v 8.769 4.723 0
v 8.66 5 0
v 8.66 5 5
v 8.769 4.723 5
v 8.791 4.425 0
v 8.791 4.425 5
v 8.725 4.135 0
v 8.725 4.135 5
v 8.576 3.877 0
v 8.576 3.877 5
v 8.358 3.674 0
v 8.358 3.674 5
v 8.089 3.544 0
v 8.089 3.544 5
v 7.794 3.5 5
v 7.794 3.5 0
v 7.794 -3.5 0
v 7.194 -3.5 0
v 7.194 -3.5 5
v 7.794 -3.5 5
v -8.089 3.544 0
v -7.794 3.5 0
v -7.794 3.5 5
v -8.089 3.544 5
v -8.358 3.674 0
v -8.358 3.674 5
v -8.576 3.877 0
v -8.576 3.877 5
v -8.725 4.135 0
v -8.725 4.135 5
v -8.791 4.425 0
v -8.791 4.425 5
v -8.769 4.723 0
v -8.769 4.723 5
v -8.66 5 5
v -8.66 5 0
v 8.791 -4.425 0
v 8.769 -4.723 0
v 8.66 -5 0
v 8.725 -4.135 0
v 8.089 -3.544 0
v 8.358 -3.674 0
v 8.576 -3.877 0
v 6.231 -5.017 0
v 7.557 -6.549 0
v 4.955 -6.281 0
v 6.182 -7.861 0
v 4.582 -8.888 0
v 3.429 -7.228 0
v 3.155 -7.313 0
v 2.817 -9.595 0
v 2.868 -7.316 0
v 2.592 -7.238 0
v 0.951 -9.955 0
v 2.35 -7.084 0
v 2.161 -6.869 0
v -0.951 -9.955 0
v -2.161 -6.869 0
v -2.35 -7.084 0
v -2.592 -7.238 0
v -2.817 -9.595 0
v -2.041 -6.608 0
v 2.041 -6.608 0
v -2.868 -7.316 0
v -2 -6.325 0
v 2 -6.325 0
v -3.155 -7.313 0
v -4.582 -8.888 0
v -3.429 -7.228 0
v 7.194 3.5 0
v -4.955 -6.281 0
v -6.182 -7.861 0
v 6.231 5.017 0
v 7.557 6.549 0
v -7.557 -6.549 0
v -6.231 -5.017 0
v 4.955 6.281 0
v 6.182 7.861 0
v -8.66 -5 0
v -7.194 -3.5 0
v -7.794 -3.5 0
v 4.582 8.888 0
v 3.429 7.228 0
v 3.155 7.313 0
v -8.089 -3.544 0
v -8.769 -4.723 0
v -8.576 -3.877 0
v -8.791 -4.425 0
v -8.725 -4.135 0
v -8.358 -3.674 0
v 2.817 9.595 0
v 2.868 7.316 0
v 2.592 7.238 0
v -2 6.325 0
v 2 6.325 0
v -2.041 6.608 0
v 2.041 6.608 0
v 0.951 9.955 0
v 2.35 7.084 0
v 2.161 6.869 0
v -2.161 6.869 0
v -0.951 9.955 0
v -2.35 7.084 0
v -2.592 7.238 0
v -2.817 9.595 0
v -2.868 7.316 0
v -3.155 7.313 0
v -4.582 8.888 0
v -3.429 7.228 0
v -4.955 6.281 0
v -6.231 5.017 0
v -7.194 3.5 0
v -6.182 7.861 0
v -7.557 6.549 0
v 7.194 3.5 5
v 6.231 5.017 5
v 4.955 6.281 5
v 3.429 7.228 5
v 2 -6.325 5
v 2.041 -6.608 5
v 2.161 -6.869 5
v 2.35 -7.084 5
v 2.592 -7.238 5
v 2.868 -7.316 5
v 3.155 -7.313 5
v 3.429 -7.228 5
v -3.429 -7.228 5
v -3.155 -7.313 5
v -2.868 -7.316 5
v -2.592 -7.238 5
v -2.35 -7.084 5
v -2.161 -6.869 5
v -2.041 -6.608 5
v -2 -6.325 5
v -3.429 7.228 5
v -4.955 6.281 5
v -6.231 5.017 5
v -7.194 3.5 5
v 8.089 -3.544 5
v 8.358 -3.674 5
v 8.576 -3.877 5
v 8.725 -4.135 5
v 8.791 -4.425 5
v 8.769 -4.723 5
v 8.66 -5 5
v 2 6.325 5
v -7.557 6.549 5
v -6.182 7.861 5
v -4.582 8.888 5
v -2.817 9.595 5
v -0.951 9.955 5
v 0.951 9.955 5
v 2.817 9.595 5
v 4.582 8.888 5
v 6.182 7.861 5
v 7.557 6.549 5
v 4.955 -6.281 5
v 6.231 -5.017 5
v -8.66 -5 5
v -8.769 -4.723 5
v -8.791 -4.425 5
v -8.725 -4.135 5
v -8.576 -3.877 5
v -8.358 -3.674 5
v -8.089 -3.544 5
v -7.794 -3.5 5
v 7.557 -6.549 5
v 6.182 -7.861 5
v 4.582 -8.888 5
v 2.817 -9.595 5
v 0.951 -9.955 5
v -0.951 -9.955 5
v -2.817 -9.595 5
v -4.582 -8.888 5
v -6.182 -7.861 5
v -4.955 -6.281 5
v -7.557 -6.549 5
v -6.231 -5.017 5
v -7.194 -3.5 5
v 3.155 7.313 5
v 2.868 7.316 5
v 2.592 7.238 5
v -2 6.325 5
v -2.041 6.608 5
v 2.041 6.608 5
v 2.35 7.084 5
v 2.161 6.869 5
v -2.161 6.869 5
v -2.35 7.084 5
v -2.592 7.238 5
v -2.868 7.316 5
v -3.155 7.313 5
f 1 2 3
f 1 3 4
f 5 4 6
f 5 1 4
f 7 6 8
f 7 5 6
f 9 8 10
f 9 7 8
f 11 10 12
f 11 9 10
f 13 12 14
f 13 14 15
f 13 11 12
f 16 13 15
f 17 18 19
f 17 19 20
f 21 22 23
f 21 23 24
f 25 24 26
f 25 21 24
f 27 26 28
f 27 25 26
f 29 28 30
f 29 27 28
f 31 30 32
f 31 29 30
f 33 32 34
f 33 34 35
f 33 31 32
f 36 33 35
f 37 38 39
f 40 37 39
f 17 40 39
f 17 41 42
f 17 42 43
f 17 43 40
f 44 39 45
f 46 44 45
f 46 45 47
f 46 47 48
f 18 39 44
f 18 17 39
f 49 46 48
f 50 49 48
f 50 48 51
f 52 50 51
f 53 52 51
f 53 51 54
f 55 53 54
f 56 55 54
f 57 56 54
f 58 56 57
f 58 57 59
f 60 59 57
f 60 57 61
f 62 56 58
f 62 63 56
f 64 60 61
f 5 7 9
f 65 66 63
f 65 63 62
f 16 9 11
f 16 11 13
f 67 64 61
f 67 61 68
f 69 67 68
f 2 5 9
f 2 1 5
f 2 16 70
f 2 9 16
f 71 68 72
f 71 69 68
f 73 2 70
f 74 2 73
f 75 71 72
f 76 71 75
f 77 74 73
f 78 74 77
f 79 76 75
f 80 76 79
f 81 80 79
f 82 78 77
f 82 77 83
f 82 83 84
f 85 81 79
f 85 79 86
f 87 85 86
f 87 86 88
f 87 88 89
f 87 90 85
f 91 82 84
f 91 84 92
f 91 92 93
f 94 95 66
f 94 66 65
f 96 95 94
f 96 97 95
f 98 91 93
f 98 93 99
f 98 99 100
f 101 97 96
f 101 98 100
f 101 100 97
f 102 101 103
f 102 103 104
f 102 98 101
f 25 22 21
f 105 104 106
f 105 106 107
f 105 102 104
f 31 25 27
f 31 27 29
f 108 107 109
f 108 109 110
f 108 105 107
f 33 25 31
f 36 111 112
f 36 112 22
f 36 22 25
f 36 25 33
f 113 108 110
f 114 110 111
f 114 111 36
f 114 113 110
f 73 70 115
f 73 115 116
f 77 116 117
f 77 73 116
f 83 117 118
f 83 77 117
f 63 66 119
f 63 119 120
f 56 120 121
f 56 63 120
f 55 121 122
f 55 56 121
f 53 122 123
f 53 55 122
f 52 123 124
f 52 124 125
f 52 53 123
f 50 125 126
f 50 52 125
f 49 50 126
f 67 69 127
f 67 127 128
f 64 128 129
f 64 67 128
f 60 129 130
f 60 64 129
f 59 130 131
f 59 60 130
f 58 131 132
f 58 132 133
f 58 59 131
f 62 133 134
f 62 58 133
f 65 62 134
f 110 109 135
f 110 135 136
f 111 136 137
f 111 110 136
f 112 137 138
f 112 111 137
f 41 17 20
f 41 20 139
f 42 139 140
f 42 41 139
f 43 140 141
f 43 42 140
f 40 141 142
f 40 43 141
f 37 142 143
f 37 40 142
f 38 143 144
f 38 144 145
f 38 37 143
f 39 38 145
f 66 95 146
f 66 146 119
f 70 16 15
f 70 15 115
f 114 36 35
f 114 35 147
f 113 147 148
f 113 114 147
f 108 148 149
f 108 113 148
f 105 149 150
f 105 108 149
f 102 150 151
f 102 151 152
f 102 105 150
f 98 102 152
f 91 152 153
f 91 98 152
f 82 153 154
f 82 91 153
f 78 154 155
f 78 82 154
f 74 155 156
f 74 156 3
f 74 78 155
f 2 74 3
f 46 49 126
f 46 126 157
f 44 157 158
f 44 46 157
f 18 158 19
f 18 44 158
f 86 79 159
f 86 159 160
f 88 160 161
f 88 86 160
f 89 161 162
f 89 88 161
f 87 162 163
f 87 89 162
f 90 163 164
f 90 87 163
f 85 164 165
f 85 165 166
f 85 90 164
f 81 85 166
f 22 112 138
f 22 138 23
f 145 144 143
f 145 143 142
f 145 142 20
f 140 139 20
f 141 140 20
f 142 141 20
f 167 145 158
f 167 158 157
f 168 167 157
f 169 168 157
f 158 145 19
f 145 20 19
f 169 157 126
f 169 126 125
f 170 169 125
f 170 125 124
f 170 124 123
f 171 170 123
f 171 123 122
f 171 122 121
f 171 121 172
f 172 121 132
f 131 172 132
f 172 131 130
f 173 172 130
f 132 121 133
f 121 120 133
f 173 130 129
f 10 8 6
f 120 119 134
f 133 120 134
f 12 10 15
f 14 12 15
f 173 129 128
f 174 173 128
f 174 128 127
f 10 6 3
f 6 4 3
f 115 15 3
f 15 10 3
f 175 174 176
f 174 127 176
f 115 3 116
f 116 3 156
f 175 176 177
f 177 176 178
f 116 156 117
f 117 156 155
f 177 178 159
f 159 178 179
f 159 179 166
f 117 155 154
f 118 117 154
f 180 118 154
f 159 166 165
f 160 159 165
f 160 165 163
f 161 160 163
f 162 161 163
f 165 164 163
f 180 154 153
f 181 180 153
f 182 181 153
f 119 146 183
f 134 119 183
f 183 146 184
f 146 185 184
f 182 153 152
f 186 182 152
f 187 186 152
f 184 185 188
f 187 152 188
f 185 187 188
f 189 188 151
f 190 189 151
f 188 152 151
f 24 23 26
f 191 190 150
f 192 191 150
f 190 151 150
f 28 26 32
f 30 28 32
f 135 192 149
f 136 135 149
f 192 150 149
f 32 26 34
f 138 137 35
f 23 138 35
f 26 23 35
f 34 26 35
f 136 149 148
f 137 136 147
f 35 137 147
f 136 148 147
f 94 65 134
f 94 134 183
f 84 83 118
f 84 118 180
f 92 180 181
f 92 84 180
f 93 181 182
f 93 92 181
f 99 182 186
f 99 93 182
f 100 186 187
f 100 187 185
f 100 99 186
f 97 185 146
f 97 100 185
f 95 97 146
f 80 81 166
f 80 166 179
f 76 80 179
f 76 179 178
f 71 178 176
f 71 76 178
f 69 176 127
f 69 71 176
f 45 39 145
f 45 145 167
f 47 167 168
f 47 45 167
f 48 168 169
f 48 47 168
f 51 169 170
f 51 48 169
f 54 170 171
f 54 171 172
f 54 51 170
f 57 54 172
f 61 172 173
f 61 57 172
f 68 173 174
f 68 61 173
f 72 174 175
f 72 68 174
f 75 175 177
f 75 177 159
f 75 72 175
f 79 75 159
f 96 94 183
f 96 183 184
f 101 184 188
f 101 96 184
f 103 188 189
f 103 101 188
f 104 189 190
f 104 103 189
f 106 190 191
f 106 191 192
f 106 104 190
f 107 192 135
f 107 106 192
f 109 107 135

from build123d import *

# Parameters (mm, degrees)
BOSS_EXTRUDE1_DEPTH = 5


with BuildPart() as part:
    # Sketch1 → Boss-Extrude1 (new body)
    with BuildSketch(Plane.XY):
        with BuildLine():
            Line((-2, -6.32455532), (-2, 6.32455532))
            ThreePointArc((-2, 6.32455532), (-2.465477516, 7.169709575), (-3.428571429, 7.228063223))
            ThreePointArc((-3.428571429, 7.228063223), (-5.628767855, 5.684801882), (-7.193747285, 3.5))
            Line((-7.193747285, 3.5), (-7.794228634, 3.5))
            ThreePointArc((-7.794228634, 3.5), (-8.660254038, 4), (-8.660254038, 5))
            ThreePointArc((-8.660254038, 5), (0, 10), (8.660254038, 5))
            ThreePointArc((8.660254038, 5), (8.660254038, 4), (7.794228634, 3.5))
            Line((7.794228634, 3.5), (7.193747285, 3.5))
            ThreePointArc((7.193747285, 3.5), (5.628767855, 5.684801882), (3.428571429, 7.228063223))
            ThreePointArc((3.428571429, 7.228063223), (2.465477516, 7.169709575), (2, 6.32455532))
            Line((2, 6.32455532), (2, -6.32455532))
            ThreePointArc((2, -6.32455532), (2.465477516, -7.169709575), (3.428571429, -7.228063223))
            ThreePointArc((3.428571429, -7.228063223), (5.628767855, -5.684801882), (7.193747285, -3.5))
            Line((7.193747285, -3.5), (7.794228634, -3.5))
            ThreePointArc((7.794228634, -3.5), (8.660254038, -4), (8.660254038, -5))
            ThreePointArc((8.660254038, -5), (0, -10), (-8.660254038, -5))
            ThreePointArc((-8.660254038, -5), (-8.660254038, -4), (-7.794228634, -3.5))
            Line((-7.794228634, -3.5), (-7.193747285, -3.5))
            ThreePointArc((-7.193747285, -3.5), (-5.628767855, -5.684801882), (-3.428571429, -7.228063223))
            ThreePointArc((-3.428571429, -7.228063223), (-2.465477516, -7.169709575), (-2, -6.32455532))
        make_face()
    extrude(amount=BOSS_EXTRUDE1_DEPTH)


solid = part.part
